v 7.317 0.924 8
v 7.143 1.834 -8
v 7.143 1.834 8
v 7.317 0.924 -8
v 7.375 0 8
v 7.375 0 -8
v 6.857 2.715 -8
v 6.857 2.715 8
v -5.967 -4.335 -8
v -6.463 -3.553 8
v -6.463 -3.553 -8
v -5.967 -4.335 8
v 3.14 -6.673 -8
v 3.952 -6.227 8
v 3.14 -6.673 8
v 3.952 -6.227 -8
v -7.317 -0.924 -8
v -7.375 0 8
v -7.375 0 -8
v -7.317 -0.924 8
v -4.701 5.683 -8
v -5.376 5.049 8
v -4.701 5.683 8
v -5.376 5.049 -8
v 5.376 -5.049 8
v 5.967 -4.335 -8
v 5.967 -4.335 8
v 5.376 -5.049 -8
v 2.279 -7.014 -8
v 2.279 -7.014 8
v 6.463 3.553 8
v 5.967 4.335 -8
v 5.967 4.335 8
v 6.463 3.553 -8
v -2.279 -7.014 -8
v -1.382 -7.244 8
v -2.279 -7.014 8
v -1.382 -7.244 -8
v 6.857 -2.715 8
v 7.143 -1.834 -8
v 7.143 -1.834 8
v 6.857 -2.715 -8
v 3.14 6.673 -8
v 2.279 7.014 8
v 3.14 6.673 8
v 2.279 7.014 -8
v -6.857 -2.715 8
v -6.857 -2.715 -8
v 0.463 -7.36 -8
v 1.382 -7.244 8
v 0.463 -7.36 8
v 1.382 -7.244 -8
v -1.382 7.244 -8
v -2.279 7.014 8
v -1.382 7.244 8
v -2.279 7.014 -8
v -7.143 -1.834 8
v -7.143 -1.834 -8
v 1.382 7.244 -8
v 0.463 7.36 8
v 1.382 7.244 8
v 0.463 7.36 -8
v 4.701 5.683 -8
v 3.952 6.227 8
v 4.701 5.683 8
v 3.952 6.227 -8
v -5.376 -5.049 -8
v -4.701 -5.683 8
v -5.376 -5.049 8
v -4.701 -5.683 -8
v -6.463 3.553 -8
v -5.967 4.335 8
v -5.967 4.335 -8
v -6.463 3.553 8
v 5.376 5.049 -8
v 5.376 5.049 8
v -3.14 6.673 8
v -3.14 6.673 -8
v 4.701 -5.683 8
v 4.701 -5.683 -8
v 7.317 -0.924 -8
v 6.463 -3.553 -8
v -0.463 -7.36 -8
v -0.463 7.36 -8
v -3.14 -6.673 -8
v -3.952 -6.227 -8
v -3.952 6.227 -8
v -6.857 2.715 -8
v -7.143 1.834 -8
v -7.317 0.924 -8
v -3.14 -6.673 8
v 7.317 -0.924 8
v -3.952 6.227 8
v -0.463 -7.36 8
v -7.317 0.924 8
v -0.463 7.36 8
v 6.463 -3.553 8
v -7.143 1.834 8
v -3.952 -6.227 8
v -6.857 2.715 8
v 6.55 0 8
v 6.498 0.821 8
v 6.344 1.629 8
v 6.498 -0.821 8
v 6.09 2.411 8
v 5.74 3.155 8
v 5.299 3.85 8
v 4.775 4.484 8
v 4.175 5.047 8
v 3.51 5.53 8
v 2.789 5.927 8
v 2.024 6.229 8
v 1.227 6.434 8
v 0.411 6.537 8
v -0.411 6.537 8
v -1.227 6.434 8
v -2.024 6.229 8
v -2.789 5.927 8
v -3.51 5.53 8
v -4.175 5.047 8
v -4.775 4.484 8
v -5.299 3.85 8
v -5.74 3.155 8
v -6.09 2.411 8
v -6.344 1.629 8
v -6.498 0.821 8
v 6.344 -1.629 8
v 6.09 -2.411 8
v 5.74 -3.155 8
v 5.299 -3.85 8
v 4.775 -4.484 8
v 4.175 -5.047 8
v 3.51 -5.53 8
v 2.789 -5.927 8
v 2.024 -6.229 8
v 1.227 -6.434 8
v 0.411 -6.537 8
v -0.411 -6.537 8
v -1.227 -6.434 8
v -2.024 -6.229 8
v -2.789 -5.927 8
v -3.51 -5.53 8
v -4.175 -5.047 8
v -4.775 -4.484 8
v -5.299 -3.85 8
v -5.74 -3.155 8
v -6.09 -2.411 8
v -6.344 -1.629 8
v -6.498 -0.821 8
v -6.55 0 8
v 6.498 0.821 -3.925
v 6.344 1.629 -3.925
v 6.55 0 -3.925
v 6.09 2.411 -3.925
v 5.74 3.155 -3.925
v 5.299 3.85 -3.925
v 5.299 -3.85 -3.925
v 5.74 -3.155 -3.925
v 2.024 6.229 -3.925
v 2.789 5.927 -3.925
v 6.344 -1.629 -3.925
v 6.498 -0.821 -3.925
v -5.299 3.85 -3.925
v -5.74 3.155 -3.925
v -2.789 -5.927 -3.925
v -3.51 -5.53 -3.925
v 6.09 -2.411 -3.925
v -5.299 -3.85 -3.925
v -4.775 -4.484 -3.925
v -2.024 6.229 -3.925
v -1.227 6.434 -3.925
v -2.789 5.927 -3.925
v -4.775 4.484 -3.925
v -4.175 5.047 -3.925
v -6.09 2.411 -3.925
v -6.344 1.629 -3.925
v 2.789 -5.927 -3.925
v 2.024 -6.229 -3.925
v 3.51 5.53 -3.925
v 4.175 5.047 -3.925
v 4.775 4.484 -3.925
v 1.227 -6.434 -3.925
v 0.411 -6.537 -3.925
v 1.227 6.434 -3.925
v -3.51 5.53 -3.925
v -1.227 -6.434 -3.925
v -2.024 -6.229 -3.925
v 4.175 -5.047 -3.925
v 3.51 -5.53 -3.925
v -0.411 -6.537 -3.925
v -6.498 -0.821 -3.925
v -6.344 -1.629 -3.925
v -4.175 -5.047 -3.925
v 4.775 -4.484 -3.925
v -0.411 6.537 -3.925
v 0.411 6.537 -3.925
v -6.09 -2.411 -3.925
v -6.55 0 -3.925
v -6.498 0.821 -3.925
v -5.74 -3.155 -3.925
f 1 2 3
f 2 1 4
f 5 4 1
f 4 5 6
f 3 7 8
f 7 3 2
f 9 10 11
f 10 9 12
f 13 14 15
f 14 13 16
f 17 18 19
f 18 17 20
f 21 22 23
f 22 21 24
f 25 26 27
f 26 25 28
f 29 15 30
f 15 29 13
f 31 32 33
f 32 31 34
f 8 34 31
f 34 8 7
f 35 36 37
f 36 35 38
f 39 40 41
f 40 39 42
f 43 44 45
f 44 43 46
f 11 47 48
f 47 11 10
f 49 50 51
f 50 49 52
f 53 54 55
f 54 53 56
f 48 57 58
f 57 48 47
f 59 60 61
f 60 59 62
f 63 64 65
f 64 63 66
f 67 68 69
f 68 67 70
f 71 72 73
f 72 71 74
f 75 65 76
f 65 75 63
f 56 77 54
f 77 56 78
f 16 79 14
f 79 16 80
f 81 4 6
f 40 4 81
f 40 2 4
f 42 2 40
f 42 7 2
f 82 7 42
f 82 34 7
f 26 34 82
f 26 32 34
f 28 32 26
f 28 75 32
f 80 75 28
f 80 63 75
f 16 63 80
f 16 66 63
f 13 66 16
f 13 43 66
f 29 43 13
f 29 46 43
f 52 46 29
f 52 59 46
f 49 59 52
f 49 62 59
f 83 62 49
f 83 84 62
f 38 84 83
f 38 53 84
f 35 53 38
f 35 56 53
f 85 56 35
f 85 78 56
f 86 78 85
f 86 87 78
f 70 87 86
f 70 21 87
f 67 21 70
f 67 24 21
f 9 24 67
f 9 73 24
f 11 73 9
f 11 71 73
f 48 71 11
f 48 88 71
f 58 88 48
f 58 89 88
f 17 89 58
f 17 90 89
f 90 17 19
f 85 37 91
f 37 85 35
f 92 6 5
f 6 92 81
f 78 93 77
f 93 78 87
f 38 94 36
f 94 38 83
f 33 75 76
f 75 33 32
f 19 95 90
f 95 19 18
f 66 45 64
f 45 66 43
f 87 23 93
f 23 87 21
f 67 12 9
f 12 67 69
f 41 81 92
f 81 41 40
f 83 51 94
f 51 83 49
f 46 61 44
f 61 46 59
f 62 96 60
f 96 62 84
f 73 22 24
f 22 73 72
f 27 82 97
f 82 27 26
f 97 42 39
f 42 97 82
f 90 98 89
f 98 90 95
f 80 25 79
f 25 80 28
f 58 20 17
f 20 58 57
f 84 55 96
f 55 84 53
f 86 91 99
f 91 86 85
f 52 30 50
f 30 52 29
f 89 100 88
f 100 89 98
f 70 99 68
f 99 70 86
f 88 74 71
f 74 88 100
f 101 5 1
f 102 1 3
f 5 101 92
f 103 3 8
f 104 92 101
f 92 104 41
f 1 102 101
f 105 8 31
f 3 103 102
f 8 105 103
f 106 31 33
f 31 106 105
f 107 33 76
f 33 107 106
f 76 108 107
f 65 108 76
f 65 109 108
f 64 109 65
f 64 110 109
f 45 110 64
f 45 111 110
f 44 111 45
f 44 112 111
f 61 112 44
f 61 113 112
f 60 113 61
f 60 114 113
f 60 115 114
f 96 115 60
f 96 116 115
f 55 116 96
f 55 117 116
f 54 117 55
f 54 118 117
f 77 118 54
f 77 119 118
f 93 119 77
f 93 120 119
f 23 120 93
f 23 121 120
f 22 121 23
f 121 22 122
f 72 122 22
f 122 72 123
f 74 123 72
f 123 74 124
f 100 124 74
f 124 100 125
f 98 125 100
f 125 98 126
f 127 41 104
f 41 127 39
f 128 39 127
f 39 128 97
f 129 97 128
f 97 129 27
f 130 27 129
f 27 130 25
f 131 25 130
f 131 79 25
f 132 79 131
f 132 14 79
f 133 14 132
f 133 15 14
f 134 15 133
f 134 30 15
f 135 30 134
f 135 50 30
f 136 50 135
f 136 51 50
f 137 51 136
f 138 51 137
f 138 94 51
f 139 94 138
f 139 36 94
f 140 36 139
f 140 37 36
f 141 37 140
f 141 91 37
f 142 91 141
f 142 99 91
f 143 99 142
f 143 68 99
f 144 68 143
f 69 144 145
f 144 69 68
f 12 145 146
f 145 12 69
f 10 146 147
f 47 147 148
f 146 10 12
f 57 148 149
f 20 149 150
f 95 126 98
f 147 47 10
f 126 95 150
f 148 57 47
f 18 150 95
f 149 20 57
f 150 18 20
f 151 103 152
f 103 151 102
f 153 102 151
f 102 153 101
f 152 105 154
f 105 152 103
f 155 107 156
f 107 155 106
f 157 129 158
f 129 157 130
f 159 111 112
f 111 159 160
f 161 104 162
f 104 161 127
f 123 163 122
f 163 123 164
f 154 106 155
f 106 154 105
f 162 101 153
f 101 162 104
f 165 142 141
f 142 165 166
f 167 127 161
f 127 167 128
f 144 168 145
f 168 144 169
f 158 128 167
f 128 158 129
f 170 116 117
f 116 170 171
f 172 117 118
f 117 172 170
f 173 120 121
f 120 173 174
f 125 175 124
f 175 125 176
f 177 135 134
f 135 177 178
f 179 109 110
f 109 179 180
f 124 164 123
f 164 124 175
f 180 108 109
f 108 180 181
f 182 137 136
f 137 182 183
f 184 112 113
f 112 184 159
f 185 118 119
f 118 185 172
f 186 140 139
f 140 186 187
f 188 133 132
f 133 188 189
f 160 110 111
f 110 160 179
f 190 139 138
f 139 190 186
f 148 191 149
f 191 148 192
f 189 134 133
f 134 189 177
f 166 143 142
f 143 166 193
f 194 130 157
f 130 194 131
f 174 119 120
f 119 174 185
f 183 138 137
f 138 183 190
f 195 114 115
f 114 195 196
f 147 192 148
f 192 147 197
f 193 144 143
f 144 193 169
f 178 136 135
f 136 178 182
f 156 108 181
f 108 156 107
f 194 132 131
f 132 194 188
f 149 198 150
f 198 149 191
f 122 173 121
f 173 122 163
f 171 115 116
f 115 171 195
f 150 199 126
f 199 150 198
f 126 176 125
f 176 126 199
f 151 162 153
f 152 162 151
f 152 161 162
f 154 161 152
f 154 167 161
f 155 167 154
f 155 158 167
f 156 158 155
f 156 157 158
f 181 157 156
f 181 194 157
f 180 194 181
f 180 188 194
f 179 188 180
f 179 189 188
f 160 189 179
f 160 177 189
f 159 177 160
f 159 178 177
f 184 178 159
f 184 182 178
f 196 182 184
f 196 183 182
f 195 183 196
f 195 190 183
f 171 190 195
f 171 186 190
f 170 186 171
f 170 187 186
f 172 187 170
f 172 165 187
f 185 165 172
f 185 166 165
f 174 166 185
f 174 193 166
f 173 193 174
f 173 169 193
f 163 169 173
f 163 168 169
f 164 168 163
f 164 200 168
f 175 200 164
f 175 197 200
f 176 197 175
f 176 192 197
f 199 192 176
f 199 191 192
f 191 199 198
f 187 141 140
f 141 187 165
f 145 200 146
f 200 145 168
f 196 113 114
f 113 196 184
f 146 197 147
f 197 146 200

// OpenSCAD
// cap diameter in mm (not radius!)
cap_diameter=14.75; 
// wall thickenss in mm
wall_thickness=0.825; 
// Total height in mm
outer_height=16; 
// Height of interior cut out in mm
inner_height=12; 


$fn=50+0;
difference() {
cylinder(r=cap_diameter/2,h=outer_height,center=true);
translate([0,0,(outer_height-inner_height)/2+.1])
cylinder(r=cap_diameter/2-wall_thickness,h=inner_height+.05,center=true);
}
